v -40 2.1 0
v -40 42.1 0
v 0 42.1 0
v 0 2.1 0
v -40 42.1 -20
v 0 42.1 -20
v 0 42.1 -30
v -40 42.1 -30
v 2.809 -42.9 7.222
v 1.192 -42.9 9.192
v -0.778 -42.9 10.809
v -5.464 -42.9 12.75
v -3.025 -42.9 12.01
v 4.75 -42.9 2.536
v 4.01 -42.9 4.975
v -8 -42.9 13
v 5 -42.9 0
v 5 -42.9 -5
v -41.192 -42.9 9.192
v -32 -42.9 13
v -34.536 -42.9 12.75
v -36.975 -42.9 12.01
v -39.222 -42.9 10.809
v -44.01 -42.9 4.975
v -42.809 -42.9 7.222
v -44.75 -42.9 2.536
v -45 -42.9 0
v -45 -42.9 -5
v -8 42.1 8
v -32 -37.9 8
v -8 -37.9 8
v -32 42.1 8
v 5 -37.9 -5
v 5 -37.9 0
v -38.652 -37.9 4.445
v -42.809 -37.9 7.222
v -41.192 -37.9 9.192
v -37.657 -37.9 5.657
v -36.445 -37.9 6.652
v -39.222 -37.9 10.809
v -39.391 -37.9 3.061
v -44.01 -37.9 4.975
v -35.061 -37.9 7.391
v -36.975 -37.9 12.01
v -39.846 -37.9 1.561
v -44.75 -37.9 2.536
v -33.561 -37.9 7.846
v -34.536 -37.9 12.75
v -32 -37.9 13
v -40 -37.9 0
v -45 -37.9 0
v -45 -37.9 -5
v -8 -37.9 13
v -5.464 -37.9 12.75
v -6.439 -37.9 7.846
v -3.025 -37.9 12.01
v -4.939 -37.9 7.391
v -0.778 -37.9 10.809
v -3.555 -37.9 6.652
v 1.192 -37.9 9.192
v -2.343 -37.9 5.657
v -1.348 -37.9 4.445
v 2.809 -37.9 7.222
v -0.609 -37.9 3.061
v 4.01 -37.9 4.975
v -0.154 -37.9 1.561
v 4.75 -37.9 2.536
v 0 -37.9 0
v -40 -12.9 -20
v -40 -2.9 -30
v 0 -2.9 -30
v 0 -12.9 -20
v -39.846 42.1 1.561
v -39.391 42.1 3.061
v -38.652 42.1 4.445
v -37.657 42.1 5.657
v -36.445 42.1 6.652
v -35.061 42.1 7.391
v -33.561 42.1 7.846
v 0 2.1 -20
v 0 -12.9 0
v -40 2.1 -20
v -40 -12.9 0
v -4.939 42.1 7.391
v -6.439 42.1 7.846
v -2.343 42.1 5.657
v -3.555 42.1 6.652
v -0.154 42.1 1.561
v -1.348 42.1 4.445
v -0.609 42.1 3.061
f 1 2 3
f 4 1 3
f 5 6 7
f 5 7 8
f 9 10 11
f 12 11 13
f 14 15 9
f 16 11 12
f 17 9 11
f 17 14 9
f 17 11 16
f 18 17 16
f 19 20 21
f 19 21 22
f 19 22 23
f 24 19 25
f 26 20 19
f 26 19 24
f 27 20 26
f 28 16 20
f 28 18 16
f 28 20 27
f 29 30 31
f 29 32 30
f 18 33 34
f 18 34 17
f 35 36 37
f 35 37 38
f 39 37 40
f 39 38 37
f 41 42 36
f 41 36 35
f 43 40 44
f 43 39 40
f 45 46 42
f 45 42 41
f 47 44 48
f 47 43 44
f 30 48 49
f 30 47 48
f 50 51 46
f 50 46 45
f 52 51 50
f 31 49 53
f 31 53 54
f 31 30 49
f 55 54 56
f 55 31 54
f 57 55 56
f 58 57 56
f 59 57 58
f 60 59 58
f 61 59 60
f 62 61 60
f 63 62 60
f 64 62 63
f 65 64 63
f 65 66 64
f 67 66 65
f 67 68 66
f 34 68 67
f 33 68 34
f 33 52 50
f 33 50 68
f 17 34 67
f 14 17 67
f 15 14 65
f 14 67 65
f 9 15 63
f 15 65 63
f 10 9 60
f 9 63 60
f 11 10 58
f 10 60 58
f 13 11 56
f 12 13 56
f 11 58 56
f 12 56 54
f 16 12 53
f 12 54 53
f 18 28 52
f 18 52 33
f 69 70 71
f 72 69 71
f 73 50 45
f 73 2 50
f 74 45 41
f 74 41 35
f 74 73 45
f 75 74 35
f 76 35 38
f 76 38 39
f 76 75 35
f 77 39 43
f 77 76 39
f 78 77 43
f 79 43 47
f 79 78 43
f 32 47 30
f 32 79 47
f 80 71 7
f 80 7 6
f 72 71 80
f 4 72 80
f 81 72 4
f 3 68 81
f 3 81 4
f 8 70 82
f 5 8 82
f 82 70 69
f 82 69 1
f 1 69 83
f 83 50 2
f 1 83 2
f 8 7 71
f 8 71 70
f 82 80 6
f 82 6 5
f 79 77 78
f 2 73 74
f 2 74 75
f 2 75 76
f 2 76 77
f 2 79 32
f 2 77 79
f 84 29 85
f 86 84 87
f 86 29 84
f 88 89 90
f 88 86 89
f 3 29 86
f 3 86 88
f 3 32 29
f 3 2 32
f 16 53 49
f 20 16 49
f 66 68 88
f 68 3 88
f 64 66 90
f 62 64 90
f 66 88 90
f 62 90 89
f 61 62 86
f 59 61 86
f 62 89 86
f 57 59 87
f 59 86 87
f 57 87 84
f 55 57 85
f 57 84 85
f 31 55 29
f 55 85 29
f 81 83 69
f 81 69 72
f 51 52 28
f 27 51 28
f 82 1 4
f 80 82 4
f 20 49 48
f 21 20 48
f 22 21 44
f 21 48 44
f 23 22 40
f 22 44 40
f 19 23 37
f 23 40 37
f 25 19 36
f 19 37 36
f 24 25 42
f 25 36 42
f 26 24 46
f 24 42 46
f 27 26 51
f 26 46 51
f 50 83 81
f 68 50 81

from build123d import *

# Parameters (mm, degrees)
F0_W      = 40
F0_H      = 80
F1_DEPTH  = 8
F2_W      = 40
F2_H      = 15
F3_DEPTH  = 30
F4_W      = 40
F4_H      = 10
F5_DEPTH  = 40
F6_R      = 7.99999
F7_SIZE2  = 10
F7_SIZE   = 10
F9_DEPTH  = 5
F10_W     = 48
F10_H     = 5
F10_W_2   = 1
F11_DEPTH = 5


# Not quite as in the source:
# - a fillet or chamfer is up to 0.001 mm smaller than in the source, because OpenCascade refuses the exact size


with BuildPart() as f1:
    # F0 (on Top) → F1 (new body)
    with BuildSketch(Plane.XY):
        with Locations((-20, 2.0996452868)):
            Rectangle(F0_W, F0_H)
    extrude(amount=F1_DEPTH)

    # F2 (on face) → F3 (join)
    with BuildSketch(Plane(origin=(0, 0, 0), x_dir=(1, 0, 0), z_dir=(0, 0, -1))):
        with Locations((-20, 5.4003547132)):
            Rectangle(F2_W, F2_H)
    extrude(amount=F3_DEPTH)

    # F4 (on face) → F5 (join)
    with BuildSketch(Plane(origin=(0, 2.0996452868, 0), x_dir=(-1, 0, 0), z_dir=(0, 1, 0))):
        with Locations((20, -25)):
            Rectangle(F4_W, F4_H)
    extrude(amount=F5_DEPTH)

    # F6 (radius 8 in the source; OpenCascade refuses exactly that, so slightly less here)
    f6_edges = [f1.edges().sort_by_distance(p)[0] for p in [
        (0, 2.099645, 8),
        (-40, 2.099645, 8),
    ]]
    fillet(f6_edges, radius=F6_R)

    # F7
    f7_edges = [f1.edges().sort_by_distance(p)[0] for p in [
        (-20, -12.900355, -30),
    ]]
    chamfer(f7_edges, length=F7_SIZE, length2=F7_SIZE2)

    # F8 (on face) → F9 (join)
    with BuildSketch(Plane.XZ.offset(37.9003547132)):
        with BuildLine():
            Line((-44, -5), (4, -5))
            ThreePointArc((4, -5), (2.8166538264, 7.2111025509), (-8, 13))
            Line((-8, 13), (-32, 13))
            ThreePointArc((-32, 13), (-42.8166538264, 7.2111025509), (-44, -5))
        make_face()
    extrude(amount=F9_DEPTH)

    # F10 (on face) → F11 (join)
    with BuildSketch(Plane(origin=(0, 0, -5), x_dir=(1, 0, 0), z_dir=(0, 0, -1))):
        with Locations((-20, 40.4003547132)):
            Rectangle(F10_W, F10_H)
        with Locations((-44.5, 40.4003547132)):
            Rectangle(F10_W_2, F10_H)
        with Locations((4.5, 40.4003547132)):
            Rectangle(F10_W_2, F10_H)
    extrude(amount=-F11_DEPTH)


solid = f1.part
